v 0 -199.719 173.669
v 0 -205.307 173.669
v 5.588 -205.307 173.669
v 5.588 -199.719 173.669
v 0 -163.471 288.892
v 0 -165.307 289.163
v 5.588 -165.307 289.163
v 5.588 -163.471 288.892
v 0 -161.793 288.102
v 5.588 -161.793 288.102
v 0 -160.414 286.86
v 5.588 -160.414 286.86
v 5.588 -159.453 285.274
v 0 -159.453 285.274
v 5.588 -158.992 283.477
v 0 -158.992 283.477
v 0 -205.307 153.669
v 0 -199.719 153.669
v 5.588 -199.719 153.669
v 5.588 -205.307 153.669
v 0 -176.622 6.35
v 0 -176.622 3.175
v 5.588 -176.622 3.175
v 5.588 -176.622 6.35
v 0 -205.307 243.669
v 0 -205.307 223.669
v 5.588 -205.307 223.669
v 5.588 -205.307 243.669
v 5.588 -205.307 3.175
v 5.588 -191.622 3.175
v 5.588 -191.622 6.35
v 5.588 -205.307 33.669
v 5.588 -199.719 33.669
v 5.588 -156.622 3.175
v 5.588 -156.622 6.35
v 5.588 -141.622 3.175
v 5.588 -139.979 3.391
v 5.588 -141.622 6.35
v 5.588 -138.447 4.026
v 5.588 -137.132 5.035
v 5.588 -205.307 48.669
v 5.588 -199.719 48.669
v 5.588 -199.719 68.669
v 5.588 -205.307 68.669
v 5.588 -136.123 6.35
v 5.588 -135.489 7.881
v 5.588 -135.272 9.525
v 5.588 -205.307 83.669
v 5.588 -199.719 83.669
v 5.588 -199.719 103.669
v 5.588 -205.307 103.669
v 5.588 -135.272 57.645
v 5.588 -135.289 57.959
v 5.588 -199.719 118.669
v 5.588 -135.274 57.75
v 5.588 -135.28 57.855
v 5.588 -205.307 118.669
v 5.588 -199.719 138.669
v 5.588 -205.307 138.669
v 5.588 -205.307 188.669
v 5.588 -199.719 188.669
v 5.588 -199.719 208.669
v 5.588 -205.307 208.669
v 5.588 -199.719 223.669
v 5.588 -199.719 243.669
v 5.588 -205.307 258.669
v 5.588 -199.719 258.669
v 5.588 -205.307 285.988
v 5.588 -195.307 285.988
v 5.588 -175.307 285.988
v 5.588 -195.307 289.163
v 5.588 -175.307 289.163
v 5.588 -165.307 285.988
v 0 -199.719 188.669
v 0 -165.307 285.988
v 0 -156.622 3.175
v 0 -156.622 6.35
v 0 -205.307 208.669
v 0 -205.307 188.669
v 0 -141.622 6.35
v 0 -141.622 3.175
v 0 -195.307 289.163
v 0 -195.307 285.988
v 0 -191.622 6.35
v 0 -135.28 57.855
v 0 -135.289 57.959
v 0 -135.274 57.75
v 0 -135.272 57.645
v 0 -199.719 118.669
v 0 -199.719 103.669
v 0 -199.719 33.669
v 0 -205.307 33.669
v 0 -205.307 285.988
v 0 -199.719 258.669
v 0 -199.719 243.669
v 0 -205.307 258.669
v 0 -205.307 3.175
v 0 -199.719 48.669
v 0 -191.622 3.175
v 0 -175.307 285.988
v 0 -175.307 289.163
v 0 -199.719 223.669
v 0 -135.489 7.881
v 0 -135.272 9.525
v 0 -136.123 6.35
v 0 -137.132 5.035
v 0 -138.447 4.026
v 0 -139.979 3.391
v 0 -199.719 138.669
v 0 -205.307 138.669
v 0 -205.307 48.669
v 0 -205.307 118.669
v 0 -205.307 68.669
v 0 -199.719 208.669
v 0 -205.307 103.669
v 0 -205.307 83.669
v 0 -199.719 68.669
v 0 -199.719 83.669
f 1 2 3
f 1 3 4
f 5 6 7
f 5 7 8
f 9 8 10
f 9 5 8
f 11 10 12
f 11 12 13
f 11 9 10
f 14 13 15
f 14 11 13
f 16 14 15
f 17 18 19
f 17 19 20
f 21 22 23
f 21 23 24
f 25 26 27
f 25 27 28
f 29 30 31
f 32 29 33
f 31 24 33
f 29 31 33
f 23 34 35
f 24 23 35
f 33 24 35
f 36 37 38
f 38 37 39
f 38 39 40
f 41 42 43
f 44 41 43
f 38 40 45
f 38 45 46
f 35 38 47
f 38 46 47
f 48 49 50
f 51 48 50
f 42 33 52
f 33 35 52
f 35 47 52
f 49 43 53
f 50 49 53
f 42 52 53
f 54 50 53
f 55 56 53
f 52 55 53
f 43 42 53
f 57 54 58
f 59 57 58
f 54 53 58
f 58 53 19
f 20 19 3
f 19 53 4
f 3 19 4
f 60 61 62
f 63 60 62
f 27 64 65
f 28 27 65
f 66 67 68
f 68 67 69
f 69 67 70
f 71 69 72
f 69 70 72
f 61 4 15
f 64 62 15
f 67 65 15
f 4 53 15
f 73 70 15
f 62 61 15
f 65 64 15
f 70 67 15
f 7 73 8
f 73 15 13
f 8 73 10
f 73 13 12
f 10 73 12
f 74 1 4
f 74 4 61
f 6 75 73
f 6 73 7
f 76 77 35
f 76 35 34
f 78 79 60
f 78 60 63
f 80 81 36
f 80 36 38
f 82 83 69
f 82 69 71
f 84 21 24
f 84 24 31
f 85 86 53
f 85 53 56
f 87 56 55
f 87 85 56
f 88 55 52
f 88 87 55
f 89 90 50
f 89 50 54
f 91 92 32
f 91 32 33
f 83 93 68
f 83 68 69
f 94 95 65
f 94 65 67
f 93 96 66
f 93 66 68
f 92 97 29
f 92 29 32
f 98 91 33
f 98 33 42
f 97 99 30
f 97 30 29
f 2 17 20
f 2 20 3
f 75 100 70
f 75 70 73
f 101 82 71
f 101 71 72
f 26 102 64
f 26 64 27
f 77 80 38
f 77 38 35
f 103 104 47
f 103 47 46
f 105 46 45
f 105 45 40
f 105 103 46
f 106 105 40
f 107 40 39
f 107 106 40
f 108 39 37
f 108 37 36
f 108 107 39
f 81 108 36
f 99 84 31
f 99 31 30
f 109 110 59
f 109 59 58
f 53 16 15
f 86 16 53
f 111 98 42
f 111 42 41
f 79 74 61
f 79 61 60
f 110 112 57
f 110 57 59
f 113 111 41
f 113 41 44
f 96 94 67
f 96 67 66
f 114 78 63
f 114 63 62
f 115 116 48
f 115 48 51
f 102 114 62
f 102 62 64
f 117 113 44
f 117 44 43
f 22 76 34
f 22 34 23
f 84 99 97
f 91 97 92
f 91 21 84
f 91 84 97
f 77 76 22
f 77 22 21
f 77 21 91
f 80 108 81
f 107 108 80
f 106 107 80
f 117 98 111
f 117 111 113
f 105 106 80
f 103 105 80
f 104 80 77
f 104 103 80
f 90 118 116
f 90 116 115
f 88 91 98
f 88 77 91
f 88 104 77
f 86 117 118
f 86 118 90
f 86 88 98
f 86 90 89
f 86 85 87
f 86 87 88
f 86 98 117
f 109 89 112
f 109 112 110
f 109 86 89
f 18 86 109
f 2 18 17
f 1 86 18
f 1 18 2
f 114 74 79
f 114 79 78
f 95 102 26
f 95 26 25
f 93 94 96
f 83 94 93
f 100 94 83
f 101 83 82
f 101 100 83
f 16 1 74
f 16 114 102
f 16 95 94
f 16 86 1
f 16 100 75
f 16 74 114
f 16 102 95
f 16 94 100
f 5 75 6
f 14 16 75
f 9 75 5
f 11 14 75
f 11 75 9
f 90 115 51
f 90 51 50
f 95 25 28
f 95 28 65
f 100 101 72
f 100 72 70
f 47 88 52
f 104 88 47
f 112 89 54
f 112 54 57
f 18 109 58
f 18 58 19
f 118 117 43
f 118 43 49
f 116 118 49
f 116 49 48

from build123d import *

# Parameters (mm, degrees)
BOSS_EXTRUDE1_DEPTH = 5.588


with BuildPart() as part:
    # Sketch26 → Boss-Extrude1 (new body)
    with BuildSketch(Plane(origin=(0, 0, 0), x_dir=(0, 0, -1), z_dir=(1, 0, 0))):
        with BuildLine():
            Line((-3.175, -205.30682867), (-33.668926811, -205.30682867))
            Line((-33.668926811, -205.30682867), (-33.668926811, -199.71882867))
            Line((-33.668926811, -199.71882867), (-48.668926811, -199.71882867))
            Line((-48.668926811, -199.71882867), (-48.668926811, -205.30682867))
            Line((-48.668926811, -205.30682867), (-68.668926811, -205.30682867))
            Line((-68.668926811, -205.30682867), (-68.668926811, -199.71882867))
            Line((-68.668926811, -199.71882867), (-83.668926811, -199.71882867))
            Line((-83.668926811, -199.71882867), (-83.668926811, -205.30682867))
            Line((-83.668926811, -205.30682867), (-103.668926811, -205.30682867))
            Line((-103.668926811, -205.30682867), (-103.668926811, -199.71882867))
            Line((-103.668926811, -199.71882867), (-118.668926811, -199.71882867))
            Line((-118.668926811, -199.71882867), (-118.668926811, -205.30682867))
            Line((-118.668926811, -205.30682867), (-138.668926811, -205.30682867))
            Line((-138.668926811, -205.30682867), (-138.668926811, -199.71882867))
            Line((-138.668926811, -199.71882867), (-153.668926811, -199.71882867))
            Line((-153.668926811, -199.71882867), (-153.668926811, -205.30682867))
            Line((-153.668926811, -205.30682867), (-173.668926811, -205.30682867))
            Line((-173.668926811, -205.30682867), (-173.668926811, -199.71882867))
            Line((-173.668926811, -199.71882867), (-188.668926811, -199.71882867))
            Line((-188.668926811, -199.71882867), (-188.668926811, -205.30682867))
            Line((-188.668926811, -205.30682867), (-208.668926811, -205.30682867))
            Line((-208.668926811, -205.30682867), (-208.668926811, -199.71882867))
            Line((-208.668926811, -199.71882867), (-223.668926811, -199.71882867))
            Line((-223.668926811, -199.71882867), (-223.668926811, -205.30682867))
            Line((-223.668926811, -205.30682867), (-243.668926811, -205.30682867))
            Line((-243.668926811, -205.30682867), (-243.668926811, -199.71882867))
            Line((-243.668926811, -199.71882867), (-258.668926811, -199.71882867))
            Line((-258.668926811, -199.71882867), (-258.668926811, -205.30682867))
            Line((-258.668926811, -205.30682867), (-285.987853622, -205.30682867))
            Line((-285.987853622, -205.30682867), (-285.987853622, -195.30682867))
            Line((-285.987853622, -195.30682867), (-289.162853622, -195.30682867))
            Line((-289.162853622, -195.30682867), (-289.162853622, -175.30682867))
            Line((-289.162853622, -175.30682867), (-285.987853622, -175.30682867))
            Line((-285.987853622, -175.30682867), (-285.987853622, -165.30682867))
            Line((-285.987853622, -165.30682867), (-289.162853622, -165.30682867))
            ThreePointArc((-289.162853622, -165.30682867), (-287.531823263, -161.057849319), (-283.476609363, -158.991614634))
            Line((-283.476609363, -158.991614634), (-57.959024207, -135.288761307))
            ThreePointArc((-57.959024207, -135.288761307), (-57.802446686, -135.276438389), (-57.645438817, -135.272326993))
            Line((-57.645438817, -135.272326993), (-9.525, -135.272326993))
            ThreePointArc((-9.525, -135.272326993), (-5.034871939, -137.132198933), (-3.175, -141.622326993))
            Line((-3.175, -141.622326993), (-6.35, -141.622326993))
            Line((-6.35, -141.622326993), (-6.35, -156.622326993))
            Line((-6.35, -156.622326993), (-3.175, -156.622326993))
            Line((-3.175, -156.622326993), (-3.175, -176.622326993))
            Line((-3.175, -176.622326993), (-6.35, -176.622326993))
            Line((-6.35, -176.622326993), (-6.35, -191.622326993))
            Line((-6.35, -191.622326993), (-3.175, -191.622326993))
            Line((-3.175, -191.622326993), (-3.175, -205.30682867))
        make_face()
    extrude(amount=BOSS_EXTRUDE1_DEPTH)


solid = part.part
